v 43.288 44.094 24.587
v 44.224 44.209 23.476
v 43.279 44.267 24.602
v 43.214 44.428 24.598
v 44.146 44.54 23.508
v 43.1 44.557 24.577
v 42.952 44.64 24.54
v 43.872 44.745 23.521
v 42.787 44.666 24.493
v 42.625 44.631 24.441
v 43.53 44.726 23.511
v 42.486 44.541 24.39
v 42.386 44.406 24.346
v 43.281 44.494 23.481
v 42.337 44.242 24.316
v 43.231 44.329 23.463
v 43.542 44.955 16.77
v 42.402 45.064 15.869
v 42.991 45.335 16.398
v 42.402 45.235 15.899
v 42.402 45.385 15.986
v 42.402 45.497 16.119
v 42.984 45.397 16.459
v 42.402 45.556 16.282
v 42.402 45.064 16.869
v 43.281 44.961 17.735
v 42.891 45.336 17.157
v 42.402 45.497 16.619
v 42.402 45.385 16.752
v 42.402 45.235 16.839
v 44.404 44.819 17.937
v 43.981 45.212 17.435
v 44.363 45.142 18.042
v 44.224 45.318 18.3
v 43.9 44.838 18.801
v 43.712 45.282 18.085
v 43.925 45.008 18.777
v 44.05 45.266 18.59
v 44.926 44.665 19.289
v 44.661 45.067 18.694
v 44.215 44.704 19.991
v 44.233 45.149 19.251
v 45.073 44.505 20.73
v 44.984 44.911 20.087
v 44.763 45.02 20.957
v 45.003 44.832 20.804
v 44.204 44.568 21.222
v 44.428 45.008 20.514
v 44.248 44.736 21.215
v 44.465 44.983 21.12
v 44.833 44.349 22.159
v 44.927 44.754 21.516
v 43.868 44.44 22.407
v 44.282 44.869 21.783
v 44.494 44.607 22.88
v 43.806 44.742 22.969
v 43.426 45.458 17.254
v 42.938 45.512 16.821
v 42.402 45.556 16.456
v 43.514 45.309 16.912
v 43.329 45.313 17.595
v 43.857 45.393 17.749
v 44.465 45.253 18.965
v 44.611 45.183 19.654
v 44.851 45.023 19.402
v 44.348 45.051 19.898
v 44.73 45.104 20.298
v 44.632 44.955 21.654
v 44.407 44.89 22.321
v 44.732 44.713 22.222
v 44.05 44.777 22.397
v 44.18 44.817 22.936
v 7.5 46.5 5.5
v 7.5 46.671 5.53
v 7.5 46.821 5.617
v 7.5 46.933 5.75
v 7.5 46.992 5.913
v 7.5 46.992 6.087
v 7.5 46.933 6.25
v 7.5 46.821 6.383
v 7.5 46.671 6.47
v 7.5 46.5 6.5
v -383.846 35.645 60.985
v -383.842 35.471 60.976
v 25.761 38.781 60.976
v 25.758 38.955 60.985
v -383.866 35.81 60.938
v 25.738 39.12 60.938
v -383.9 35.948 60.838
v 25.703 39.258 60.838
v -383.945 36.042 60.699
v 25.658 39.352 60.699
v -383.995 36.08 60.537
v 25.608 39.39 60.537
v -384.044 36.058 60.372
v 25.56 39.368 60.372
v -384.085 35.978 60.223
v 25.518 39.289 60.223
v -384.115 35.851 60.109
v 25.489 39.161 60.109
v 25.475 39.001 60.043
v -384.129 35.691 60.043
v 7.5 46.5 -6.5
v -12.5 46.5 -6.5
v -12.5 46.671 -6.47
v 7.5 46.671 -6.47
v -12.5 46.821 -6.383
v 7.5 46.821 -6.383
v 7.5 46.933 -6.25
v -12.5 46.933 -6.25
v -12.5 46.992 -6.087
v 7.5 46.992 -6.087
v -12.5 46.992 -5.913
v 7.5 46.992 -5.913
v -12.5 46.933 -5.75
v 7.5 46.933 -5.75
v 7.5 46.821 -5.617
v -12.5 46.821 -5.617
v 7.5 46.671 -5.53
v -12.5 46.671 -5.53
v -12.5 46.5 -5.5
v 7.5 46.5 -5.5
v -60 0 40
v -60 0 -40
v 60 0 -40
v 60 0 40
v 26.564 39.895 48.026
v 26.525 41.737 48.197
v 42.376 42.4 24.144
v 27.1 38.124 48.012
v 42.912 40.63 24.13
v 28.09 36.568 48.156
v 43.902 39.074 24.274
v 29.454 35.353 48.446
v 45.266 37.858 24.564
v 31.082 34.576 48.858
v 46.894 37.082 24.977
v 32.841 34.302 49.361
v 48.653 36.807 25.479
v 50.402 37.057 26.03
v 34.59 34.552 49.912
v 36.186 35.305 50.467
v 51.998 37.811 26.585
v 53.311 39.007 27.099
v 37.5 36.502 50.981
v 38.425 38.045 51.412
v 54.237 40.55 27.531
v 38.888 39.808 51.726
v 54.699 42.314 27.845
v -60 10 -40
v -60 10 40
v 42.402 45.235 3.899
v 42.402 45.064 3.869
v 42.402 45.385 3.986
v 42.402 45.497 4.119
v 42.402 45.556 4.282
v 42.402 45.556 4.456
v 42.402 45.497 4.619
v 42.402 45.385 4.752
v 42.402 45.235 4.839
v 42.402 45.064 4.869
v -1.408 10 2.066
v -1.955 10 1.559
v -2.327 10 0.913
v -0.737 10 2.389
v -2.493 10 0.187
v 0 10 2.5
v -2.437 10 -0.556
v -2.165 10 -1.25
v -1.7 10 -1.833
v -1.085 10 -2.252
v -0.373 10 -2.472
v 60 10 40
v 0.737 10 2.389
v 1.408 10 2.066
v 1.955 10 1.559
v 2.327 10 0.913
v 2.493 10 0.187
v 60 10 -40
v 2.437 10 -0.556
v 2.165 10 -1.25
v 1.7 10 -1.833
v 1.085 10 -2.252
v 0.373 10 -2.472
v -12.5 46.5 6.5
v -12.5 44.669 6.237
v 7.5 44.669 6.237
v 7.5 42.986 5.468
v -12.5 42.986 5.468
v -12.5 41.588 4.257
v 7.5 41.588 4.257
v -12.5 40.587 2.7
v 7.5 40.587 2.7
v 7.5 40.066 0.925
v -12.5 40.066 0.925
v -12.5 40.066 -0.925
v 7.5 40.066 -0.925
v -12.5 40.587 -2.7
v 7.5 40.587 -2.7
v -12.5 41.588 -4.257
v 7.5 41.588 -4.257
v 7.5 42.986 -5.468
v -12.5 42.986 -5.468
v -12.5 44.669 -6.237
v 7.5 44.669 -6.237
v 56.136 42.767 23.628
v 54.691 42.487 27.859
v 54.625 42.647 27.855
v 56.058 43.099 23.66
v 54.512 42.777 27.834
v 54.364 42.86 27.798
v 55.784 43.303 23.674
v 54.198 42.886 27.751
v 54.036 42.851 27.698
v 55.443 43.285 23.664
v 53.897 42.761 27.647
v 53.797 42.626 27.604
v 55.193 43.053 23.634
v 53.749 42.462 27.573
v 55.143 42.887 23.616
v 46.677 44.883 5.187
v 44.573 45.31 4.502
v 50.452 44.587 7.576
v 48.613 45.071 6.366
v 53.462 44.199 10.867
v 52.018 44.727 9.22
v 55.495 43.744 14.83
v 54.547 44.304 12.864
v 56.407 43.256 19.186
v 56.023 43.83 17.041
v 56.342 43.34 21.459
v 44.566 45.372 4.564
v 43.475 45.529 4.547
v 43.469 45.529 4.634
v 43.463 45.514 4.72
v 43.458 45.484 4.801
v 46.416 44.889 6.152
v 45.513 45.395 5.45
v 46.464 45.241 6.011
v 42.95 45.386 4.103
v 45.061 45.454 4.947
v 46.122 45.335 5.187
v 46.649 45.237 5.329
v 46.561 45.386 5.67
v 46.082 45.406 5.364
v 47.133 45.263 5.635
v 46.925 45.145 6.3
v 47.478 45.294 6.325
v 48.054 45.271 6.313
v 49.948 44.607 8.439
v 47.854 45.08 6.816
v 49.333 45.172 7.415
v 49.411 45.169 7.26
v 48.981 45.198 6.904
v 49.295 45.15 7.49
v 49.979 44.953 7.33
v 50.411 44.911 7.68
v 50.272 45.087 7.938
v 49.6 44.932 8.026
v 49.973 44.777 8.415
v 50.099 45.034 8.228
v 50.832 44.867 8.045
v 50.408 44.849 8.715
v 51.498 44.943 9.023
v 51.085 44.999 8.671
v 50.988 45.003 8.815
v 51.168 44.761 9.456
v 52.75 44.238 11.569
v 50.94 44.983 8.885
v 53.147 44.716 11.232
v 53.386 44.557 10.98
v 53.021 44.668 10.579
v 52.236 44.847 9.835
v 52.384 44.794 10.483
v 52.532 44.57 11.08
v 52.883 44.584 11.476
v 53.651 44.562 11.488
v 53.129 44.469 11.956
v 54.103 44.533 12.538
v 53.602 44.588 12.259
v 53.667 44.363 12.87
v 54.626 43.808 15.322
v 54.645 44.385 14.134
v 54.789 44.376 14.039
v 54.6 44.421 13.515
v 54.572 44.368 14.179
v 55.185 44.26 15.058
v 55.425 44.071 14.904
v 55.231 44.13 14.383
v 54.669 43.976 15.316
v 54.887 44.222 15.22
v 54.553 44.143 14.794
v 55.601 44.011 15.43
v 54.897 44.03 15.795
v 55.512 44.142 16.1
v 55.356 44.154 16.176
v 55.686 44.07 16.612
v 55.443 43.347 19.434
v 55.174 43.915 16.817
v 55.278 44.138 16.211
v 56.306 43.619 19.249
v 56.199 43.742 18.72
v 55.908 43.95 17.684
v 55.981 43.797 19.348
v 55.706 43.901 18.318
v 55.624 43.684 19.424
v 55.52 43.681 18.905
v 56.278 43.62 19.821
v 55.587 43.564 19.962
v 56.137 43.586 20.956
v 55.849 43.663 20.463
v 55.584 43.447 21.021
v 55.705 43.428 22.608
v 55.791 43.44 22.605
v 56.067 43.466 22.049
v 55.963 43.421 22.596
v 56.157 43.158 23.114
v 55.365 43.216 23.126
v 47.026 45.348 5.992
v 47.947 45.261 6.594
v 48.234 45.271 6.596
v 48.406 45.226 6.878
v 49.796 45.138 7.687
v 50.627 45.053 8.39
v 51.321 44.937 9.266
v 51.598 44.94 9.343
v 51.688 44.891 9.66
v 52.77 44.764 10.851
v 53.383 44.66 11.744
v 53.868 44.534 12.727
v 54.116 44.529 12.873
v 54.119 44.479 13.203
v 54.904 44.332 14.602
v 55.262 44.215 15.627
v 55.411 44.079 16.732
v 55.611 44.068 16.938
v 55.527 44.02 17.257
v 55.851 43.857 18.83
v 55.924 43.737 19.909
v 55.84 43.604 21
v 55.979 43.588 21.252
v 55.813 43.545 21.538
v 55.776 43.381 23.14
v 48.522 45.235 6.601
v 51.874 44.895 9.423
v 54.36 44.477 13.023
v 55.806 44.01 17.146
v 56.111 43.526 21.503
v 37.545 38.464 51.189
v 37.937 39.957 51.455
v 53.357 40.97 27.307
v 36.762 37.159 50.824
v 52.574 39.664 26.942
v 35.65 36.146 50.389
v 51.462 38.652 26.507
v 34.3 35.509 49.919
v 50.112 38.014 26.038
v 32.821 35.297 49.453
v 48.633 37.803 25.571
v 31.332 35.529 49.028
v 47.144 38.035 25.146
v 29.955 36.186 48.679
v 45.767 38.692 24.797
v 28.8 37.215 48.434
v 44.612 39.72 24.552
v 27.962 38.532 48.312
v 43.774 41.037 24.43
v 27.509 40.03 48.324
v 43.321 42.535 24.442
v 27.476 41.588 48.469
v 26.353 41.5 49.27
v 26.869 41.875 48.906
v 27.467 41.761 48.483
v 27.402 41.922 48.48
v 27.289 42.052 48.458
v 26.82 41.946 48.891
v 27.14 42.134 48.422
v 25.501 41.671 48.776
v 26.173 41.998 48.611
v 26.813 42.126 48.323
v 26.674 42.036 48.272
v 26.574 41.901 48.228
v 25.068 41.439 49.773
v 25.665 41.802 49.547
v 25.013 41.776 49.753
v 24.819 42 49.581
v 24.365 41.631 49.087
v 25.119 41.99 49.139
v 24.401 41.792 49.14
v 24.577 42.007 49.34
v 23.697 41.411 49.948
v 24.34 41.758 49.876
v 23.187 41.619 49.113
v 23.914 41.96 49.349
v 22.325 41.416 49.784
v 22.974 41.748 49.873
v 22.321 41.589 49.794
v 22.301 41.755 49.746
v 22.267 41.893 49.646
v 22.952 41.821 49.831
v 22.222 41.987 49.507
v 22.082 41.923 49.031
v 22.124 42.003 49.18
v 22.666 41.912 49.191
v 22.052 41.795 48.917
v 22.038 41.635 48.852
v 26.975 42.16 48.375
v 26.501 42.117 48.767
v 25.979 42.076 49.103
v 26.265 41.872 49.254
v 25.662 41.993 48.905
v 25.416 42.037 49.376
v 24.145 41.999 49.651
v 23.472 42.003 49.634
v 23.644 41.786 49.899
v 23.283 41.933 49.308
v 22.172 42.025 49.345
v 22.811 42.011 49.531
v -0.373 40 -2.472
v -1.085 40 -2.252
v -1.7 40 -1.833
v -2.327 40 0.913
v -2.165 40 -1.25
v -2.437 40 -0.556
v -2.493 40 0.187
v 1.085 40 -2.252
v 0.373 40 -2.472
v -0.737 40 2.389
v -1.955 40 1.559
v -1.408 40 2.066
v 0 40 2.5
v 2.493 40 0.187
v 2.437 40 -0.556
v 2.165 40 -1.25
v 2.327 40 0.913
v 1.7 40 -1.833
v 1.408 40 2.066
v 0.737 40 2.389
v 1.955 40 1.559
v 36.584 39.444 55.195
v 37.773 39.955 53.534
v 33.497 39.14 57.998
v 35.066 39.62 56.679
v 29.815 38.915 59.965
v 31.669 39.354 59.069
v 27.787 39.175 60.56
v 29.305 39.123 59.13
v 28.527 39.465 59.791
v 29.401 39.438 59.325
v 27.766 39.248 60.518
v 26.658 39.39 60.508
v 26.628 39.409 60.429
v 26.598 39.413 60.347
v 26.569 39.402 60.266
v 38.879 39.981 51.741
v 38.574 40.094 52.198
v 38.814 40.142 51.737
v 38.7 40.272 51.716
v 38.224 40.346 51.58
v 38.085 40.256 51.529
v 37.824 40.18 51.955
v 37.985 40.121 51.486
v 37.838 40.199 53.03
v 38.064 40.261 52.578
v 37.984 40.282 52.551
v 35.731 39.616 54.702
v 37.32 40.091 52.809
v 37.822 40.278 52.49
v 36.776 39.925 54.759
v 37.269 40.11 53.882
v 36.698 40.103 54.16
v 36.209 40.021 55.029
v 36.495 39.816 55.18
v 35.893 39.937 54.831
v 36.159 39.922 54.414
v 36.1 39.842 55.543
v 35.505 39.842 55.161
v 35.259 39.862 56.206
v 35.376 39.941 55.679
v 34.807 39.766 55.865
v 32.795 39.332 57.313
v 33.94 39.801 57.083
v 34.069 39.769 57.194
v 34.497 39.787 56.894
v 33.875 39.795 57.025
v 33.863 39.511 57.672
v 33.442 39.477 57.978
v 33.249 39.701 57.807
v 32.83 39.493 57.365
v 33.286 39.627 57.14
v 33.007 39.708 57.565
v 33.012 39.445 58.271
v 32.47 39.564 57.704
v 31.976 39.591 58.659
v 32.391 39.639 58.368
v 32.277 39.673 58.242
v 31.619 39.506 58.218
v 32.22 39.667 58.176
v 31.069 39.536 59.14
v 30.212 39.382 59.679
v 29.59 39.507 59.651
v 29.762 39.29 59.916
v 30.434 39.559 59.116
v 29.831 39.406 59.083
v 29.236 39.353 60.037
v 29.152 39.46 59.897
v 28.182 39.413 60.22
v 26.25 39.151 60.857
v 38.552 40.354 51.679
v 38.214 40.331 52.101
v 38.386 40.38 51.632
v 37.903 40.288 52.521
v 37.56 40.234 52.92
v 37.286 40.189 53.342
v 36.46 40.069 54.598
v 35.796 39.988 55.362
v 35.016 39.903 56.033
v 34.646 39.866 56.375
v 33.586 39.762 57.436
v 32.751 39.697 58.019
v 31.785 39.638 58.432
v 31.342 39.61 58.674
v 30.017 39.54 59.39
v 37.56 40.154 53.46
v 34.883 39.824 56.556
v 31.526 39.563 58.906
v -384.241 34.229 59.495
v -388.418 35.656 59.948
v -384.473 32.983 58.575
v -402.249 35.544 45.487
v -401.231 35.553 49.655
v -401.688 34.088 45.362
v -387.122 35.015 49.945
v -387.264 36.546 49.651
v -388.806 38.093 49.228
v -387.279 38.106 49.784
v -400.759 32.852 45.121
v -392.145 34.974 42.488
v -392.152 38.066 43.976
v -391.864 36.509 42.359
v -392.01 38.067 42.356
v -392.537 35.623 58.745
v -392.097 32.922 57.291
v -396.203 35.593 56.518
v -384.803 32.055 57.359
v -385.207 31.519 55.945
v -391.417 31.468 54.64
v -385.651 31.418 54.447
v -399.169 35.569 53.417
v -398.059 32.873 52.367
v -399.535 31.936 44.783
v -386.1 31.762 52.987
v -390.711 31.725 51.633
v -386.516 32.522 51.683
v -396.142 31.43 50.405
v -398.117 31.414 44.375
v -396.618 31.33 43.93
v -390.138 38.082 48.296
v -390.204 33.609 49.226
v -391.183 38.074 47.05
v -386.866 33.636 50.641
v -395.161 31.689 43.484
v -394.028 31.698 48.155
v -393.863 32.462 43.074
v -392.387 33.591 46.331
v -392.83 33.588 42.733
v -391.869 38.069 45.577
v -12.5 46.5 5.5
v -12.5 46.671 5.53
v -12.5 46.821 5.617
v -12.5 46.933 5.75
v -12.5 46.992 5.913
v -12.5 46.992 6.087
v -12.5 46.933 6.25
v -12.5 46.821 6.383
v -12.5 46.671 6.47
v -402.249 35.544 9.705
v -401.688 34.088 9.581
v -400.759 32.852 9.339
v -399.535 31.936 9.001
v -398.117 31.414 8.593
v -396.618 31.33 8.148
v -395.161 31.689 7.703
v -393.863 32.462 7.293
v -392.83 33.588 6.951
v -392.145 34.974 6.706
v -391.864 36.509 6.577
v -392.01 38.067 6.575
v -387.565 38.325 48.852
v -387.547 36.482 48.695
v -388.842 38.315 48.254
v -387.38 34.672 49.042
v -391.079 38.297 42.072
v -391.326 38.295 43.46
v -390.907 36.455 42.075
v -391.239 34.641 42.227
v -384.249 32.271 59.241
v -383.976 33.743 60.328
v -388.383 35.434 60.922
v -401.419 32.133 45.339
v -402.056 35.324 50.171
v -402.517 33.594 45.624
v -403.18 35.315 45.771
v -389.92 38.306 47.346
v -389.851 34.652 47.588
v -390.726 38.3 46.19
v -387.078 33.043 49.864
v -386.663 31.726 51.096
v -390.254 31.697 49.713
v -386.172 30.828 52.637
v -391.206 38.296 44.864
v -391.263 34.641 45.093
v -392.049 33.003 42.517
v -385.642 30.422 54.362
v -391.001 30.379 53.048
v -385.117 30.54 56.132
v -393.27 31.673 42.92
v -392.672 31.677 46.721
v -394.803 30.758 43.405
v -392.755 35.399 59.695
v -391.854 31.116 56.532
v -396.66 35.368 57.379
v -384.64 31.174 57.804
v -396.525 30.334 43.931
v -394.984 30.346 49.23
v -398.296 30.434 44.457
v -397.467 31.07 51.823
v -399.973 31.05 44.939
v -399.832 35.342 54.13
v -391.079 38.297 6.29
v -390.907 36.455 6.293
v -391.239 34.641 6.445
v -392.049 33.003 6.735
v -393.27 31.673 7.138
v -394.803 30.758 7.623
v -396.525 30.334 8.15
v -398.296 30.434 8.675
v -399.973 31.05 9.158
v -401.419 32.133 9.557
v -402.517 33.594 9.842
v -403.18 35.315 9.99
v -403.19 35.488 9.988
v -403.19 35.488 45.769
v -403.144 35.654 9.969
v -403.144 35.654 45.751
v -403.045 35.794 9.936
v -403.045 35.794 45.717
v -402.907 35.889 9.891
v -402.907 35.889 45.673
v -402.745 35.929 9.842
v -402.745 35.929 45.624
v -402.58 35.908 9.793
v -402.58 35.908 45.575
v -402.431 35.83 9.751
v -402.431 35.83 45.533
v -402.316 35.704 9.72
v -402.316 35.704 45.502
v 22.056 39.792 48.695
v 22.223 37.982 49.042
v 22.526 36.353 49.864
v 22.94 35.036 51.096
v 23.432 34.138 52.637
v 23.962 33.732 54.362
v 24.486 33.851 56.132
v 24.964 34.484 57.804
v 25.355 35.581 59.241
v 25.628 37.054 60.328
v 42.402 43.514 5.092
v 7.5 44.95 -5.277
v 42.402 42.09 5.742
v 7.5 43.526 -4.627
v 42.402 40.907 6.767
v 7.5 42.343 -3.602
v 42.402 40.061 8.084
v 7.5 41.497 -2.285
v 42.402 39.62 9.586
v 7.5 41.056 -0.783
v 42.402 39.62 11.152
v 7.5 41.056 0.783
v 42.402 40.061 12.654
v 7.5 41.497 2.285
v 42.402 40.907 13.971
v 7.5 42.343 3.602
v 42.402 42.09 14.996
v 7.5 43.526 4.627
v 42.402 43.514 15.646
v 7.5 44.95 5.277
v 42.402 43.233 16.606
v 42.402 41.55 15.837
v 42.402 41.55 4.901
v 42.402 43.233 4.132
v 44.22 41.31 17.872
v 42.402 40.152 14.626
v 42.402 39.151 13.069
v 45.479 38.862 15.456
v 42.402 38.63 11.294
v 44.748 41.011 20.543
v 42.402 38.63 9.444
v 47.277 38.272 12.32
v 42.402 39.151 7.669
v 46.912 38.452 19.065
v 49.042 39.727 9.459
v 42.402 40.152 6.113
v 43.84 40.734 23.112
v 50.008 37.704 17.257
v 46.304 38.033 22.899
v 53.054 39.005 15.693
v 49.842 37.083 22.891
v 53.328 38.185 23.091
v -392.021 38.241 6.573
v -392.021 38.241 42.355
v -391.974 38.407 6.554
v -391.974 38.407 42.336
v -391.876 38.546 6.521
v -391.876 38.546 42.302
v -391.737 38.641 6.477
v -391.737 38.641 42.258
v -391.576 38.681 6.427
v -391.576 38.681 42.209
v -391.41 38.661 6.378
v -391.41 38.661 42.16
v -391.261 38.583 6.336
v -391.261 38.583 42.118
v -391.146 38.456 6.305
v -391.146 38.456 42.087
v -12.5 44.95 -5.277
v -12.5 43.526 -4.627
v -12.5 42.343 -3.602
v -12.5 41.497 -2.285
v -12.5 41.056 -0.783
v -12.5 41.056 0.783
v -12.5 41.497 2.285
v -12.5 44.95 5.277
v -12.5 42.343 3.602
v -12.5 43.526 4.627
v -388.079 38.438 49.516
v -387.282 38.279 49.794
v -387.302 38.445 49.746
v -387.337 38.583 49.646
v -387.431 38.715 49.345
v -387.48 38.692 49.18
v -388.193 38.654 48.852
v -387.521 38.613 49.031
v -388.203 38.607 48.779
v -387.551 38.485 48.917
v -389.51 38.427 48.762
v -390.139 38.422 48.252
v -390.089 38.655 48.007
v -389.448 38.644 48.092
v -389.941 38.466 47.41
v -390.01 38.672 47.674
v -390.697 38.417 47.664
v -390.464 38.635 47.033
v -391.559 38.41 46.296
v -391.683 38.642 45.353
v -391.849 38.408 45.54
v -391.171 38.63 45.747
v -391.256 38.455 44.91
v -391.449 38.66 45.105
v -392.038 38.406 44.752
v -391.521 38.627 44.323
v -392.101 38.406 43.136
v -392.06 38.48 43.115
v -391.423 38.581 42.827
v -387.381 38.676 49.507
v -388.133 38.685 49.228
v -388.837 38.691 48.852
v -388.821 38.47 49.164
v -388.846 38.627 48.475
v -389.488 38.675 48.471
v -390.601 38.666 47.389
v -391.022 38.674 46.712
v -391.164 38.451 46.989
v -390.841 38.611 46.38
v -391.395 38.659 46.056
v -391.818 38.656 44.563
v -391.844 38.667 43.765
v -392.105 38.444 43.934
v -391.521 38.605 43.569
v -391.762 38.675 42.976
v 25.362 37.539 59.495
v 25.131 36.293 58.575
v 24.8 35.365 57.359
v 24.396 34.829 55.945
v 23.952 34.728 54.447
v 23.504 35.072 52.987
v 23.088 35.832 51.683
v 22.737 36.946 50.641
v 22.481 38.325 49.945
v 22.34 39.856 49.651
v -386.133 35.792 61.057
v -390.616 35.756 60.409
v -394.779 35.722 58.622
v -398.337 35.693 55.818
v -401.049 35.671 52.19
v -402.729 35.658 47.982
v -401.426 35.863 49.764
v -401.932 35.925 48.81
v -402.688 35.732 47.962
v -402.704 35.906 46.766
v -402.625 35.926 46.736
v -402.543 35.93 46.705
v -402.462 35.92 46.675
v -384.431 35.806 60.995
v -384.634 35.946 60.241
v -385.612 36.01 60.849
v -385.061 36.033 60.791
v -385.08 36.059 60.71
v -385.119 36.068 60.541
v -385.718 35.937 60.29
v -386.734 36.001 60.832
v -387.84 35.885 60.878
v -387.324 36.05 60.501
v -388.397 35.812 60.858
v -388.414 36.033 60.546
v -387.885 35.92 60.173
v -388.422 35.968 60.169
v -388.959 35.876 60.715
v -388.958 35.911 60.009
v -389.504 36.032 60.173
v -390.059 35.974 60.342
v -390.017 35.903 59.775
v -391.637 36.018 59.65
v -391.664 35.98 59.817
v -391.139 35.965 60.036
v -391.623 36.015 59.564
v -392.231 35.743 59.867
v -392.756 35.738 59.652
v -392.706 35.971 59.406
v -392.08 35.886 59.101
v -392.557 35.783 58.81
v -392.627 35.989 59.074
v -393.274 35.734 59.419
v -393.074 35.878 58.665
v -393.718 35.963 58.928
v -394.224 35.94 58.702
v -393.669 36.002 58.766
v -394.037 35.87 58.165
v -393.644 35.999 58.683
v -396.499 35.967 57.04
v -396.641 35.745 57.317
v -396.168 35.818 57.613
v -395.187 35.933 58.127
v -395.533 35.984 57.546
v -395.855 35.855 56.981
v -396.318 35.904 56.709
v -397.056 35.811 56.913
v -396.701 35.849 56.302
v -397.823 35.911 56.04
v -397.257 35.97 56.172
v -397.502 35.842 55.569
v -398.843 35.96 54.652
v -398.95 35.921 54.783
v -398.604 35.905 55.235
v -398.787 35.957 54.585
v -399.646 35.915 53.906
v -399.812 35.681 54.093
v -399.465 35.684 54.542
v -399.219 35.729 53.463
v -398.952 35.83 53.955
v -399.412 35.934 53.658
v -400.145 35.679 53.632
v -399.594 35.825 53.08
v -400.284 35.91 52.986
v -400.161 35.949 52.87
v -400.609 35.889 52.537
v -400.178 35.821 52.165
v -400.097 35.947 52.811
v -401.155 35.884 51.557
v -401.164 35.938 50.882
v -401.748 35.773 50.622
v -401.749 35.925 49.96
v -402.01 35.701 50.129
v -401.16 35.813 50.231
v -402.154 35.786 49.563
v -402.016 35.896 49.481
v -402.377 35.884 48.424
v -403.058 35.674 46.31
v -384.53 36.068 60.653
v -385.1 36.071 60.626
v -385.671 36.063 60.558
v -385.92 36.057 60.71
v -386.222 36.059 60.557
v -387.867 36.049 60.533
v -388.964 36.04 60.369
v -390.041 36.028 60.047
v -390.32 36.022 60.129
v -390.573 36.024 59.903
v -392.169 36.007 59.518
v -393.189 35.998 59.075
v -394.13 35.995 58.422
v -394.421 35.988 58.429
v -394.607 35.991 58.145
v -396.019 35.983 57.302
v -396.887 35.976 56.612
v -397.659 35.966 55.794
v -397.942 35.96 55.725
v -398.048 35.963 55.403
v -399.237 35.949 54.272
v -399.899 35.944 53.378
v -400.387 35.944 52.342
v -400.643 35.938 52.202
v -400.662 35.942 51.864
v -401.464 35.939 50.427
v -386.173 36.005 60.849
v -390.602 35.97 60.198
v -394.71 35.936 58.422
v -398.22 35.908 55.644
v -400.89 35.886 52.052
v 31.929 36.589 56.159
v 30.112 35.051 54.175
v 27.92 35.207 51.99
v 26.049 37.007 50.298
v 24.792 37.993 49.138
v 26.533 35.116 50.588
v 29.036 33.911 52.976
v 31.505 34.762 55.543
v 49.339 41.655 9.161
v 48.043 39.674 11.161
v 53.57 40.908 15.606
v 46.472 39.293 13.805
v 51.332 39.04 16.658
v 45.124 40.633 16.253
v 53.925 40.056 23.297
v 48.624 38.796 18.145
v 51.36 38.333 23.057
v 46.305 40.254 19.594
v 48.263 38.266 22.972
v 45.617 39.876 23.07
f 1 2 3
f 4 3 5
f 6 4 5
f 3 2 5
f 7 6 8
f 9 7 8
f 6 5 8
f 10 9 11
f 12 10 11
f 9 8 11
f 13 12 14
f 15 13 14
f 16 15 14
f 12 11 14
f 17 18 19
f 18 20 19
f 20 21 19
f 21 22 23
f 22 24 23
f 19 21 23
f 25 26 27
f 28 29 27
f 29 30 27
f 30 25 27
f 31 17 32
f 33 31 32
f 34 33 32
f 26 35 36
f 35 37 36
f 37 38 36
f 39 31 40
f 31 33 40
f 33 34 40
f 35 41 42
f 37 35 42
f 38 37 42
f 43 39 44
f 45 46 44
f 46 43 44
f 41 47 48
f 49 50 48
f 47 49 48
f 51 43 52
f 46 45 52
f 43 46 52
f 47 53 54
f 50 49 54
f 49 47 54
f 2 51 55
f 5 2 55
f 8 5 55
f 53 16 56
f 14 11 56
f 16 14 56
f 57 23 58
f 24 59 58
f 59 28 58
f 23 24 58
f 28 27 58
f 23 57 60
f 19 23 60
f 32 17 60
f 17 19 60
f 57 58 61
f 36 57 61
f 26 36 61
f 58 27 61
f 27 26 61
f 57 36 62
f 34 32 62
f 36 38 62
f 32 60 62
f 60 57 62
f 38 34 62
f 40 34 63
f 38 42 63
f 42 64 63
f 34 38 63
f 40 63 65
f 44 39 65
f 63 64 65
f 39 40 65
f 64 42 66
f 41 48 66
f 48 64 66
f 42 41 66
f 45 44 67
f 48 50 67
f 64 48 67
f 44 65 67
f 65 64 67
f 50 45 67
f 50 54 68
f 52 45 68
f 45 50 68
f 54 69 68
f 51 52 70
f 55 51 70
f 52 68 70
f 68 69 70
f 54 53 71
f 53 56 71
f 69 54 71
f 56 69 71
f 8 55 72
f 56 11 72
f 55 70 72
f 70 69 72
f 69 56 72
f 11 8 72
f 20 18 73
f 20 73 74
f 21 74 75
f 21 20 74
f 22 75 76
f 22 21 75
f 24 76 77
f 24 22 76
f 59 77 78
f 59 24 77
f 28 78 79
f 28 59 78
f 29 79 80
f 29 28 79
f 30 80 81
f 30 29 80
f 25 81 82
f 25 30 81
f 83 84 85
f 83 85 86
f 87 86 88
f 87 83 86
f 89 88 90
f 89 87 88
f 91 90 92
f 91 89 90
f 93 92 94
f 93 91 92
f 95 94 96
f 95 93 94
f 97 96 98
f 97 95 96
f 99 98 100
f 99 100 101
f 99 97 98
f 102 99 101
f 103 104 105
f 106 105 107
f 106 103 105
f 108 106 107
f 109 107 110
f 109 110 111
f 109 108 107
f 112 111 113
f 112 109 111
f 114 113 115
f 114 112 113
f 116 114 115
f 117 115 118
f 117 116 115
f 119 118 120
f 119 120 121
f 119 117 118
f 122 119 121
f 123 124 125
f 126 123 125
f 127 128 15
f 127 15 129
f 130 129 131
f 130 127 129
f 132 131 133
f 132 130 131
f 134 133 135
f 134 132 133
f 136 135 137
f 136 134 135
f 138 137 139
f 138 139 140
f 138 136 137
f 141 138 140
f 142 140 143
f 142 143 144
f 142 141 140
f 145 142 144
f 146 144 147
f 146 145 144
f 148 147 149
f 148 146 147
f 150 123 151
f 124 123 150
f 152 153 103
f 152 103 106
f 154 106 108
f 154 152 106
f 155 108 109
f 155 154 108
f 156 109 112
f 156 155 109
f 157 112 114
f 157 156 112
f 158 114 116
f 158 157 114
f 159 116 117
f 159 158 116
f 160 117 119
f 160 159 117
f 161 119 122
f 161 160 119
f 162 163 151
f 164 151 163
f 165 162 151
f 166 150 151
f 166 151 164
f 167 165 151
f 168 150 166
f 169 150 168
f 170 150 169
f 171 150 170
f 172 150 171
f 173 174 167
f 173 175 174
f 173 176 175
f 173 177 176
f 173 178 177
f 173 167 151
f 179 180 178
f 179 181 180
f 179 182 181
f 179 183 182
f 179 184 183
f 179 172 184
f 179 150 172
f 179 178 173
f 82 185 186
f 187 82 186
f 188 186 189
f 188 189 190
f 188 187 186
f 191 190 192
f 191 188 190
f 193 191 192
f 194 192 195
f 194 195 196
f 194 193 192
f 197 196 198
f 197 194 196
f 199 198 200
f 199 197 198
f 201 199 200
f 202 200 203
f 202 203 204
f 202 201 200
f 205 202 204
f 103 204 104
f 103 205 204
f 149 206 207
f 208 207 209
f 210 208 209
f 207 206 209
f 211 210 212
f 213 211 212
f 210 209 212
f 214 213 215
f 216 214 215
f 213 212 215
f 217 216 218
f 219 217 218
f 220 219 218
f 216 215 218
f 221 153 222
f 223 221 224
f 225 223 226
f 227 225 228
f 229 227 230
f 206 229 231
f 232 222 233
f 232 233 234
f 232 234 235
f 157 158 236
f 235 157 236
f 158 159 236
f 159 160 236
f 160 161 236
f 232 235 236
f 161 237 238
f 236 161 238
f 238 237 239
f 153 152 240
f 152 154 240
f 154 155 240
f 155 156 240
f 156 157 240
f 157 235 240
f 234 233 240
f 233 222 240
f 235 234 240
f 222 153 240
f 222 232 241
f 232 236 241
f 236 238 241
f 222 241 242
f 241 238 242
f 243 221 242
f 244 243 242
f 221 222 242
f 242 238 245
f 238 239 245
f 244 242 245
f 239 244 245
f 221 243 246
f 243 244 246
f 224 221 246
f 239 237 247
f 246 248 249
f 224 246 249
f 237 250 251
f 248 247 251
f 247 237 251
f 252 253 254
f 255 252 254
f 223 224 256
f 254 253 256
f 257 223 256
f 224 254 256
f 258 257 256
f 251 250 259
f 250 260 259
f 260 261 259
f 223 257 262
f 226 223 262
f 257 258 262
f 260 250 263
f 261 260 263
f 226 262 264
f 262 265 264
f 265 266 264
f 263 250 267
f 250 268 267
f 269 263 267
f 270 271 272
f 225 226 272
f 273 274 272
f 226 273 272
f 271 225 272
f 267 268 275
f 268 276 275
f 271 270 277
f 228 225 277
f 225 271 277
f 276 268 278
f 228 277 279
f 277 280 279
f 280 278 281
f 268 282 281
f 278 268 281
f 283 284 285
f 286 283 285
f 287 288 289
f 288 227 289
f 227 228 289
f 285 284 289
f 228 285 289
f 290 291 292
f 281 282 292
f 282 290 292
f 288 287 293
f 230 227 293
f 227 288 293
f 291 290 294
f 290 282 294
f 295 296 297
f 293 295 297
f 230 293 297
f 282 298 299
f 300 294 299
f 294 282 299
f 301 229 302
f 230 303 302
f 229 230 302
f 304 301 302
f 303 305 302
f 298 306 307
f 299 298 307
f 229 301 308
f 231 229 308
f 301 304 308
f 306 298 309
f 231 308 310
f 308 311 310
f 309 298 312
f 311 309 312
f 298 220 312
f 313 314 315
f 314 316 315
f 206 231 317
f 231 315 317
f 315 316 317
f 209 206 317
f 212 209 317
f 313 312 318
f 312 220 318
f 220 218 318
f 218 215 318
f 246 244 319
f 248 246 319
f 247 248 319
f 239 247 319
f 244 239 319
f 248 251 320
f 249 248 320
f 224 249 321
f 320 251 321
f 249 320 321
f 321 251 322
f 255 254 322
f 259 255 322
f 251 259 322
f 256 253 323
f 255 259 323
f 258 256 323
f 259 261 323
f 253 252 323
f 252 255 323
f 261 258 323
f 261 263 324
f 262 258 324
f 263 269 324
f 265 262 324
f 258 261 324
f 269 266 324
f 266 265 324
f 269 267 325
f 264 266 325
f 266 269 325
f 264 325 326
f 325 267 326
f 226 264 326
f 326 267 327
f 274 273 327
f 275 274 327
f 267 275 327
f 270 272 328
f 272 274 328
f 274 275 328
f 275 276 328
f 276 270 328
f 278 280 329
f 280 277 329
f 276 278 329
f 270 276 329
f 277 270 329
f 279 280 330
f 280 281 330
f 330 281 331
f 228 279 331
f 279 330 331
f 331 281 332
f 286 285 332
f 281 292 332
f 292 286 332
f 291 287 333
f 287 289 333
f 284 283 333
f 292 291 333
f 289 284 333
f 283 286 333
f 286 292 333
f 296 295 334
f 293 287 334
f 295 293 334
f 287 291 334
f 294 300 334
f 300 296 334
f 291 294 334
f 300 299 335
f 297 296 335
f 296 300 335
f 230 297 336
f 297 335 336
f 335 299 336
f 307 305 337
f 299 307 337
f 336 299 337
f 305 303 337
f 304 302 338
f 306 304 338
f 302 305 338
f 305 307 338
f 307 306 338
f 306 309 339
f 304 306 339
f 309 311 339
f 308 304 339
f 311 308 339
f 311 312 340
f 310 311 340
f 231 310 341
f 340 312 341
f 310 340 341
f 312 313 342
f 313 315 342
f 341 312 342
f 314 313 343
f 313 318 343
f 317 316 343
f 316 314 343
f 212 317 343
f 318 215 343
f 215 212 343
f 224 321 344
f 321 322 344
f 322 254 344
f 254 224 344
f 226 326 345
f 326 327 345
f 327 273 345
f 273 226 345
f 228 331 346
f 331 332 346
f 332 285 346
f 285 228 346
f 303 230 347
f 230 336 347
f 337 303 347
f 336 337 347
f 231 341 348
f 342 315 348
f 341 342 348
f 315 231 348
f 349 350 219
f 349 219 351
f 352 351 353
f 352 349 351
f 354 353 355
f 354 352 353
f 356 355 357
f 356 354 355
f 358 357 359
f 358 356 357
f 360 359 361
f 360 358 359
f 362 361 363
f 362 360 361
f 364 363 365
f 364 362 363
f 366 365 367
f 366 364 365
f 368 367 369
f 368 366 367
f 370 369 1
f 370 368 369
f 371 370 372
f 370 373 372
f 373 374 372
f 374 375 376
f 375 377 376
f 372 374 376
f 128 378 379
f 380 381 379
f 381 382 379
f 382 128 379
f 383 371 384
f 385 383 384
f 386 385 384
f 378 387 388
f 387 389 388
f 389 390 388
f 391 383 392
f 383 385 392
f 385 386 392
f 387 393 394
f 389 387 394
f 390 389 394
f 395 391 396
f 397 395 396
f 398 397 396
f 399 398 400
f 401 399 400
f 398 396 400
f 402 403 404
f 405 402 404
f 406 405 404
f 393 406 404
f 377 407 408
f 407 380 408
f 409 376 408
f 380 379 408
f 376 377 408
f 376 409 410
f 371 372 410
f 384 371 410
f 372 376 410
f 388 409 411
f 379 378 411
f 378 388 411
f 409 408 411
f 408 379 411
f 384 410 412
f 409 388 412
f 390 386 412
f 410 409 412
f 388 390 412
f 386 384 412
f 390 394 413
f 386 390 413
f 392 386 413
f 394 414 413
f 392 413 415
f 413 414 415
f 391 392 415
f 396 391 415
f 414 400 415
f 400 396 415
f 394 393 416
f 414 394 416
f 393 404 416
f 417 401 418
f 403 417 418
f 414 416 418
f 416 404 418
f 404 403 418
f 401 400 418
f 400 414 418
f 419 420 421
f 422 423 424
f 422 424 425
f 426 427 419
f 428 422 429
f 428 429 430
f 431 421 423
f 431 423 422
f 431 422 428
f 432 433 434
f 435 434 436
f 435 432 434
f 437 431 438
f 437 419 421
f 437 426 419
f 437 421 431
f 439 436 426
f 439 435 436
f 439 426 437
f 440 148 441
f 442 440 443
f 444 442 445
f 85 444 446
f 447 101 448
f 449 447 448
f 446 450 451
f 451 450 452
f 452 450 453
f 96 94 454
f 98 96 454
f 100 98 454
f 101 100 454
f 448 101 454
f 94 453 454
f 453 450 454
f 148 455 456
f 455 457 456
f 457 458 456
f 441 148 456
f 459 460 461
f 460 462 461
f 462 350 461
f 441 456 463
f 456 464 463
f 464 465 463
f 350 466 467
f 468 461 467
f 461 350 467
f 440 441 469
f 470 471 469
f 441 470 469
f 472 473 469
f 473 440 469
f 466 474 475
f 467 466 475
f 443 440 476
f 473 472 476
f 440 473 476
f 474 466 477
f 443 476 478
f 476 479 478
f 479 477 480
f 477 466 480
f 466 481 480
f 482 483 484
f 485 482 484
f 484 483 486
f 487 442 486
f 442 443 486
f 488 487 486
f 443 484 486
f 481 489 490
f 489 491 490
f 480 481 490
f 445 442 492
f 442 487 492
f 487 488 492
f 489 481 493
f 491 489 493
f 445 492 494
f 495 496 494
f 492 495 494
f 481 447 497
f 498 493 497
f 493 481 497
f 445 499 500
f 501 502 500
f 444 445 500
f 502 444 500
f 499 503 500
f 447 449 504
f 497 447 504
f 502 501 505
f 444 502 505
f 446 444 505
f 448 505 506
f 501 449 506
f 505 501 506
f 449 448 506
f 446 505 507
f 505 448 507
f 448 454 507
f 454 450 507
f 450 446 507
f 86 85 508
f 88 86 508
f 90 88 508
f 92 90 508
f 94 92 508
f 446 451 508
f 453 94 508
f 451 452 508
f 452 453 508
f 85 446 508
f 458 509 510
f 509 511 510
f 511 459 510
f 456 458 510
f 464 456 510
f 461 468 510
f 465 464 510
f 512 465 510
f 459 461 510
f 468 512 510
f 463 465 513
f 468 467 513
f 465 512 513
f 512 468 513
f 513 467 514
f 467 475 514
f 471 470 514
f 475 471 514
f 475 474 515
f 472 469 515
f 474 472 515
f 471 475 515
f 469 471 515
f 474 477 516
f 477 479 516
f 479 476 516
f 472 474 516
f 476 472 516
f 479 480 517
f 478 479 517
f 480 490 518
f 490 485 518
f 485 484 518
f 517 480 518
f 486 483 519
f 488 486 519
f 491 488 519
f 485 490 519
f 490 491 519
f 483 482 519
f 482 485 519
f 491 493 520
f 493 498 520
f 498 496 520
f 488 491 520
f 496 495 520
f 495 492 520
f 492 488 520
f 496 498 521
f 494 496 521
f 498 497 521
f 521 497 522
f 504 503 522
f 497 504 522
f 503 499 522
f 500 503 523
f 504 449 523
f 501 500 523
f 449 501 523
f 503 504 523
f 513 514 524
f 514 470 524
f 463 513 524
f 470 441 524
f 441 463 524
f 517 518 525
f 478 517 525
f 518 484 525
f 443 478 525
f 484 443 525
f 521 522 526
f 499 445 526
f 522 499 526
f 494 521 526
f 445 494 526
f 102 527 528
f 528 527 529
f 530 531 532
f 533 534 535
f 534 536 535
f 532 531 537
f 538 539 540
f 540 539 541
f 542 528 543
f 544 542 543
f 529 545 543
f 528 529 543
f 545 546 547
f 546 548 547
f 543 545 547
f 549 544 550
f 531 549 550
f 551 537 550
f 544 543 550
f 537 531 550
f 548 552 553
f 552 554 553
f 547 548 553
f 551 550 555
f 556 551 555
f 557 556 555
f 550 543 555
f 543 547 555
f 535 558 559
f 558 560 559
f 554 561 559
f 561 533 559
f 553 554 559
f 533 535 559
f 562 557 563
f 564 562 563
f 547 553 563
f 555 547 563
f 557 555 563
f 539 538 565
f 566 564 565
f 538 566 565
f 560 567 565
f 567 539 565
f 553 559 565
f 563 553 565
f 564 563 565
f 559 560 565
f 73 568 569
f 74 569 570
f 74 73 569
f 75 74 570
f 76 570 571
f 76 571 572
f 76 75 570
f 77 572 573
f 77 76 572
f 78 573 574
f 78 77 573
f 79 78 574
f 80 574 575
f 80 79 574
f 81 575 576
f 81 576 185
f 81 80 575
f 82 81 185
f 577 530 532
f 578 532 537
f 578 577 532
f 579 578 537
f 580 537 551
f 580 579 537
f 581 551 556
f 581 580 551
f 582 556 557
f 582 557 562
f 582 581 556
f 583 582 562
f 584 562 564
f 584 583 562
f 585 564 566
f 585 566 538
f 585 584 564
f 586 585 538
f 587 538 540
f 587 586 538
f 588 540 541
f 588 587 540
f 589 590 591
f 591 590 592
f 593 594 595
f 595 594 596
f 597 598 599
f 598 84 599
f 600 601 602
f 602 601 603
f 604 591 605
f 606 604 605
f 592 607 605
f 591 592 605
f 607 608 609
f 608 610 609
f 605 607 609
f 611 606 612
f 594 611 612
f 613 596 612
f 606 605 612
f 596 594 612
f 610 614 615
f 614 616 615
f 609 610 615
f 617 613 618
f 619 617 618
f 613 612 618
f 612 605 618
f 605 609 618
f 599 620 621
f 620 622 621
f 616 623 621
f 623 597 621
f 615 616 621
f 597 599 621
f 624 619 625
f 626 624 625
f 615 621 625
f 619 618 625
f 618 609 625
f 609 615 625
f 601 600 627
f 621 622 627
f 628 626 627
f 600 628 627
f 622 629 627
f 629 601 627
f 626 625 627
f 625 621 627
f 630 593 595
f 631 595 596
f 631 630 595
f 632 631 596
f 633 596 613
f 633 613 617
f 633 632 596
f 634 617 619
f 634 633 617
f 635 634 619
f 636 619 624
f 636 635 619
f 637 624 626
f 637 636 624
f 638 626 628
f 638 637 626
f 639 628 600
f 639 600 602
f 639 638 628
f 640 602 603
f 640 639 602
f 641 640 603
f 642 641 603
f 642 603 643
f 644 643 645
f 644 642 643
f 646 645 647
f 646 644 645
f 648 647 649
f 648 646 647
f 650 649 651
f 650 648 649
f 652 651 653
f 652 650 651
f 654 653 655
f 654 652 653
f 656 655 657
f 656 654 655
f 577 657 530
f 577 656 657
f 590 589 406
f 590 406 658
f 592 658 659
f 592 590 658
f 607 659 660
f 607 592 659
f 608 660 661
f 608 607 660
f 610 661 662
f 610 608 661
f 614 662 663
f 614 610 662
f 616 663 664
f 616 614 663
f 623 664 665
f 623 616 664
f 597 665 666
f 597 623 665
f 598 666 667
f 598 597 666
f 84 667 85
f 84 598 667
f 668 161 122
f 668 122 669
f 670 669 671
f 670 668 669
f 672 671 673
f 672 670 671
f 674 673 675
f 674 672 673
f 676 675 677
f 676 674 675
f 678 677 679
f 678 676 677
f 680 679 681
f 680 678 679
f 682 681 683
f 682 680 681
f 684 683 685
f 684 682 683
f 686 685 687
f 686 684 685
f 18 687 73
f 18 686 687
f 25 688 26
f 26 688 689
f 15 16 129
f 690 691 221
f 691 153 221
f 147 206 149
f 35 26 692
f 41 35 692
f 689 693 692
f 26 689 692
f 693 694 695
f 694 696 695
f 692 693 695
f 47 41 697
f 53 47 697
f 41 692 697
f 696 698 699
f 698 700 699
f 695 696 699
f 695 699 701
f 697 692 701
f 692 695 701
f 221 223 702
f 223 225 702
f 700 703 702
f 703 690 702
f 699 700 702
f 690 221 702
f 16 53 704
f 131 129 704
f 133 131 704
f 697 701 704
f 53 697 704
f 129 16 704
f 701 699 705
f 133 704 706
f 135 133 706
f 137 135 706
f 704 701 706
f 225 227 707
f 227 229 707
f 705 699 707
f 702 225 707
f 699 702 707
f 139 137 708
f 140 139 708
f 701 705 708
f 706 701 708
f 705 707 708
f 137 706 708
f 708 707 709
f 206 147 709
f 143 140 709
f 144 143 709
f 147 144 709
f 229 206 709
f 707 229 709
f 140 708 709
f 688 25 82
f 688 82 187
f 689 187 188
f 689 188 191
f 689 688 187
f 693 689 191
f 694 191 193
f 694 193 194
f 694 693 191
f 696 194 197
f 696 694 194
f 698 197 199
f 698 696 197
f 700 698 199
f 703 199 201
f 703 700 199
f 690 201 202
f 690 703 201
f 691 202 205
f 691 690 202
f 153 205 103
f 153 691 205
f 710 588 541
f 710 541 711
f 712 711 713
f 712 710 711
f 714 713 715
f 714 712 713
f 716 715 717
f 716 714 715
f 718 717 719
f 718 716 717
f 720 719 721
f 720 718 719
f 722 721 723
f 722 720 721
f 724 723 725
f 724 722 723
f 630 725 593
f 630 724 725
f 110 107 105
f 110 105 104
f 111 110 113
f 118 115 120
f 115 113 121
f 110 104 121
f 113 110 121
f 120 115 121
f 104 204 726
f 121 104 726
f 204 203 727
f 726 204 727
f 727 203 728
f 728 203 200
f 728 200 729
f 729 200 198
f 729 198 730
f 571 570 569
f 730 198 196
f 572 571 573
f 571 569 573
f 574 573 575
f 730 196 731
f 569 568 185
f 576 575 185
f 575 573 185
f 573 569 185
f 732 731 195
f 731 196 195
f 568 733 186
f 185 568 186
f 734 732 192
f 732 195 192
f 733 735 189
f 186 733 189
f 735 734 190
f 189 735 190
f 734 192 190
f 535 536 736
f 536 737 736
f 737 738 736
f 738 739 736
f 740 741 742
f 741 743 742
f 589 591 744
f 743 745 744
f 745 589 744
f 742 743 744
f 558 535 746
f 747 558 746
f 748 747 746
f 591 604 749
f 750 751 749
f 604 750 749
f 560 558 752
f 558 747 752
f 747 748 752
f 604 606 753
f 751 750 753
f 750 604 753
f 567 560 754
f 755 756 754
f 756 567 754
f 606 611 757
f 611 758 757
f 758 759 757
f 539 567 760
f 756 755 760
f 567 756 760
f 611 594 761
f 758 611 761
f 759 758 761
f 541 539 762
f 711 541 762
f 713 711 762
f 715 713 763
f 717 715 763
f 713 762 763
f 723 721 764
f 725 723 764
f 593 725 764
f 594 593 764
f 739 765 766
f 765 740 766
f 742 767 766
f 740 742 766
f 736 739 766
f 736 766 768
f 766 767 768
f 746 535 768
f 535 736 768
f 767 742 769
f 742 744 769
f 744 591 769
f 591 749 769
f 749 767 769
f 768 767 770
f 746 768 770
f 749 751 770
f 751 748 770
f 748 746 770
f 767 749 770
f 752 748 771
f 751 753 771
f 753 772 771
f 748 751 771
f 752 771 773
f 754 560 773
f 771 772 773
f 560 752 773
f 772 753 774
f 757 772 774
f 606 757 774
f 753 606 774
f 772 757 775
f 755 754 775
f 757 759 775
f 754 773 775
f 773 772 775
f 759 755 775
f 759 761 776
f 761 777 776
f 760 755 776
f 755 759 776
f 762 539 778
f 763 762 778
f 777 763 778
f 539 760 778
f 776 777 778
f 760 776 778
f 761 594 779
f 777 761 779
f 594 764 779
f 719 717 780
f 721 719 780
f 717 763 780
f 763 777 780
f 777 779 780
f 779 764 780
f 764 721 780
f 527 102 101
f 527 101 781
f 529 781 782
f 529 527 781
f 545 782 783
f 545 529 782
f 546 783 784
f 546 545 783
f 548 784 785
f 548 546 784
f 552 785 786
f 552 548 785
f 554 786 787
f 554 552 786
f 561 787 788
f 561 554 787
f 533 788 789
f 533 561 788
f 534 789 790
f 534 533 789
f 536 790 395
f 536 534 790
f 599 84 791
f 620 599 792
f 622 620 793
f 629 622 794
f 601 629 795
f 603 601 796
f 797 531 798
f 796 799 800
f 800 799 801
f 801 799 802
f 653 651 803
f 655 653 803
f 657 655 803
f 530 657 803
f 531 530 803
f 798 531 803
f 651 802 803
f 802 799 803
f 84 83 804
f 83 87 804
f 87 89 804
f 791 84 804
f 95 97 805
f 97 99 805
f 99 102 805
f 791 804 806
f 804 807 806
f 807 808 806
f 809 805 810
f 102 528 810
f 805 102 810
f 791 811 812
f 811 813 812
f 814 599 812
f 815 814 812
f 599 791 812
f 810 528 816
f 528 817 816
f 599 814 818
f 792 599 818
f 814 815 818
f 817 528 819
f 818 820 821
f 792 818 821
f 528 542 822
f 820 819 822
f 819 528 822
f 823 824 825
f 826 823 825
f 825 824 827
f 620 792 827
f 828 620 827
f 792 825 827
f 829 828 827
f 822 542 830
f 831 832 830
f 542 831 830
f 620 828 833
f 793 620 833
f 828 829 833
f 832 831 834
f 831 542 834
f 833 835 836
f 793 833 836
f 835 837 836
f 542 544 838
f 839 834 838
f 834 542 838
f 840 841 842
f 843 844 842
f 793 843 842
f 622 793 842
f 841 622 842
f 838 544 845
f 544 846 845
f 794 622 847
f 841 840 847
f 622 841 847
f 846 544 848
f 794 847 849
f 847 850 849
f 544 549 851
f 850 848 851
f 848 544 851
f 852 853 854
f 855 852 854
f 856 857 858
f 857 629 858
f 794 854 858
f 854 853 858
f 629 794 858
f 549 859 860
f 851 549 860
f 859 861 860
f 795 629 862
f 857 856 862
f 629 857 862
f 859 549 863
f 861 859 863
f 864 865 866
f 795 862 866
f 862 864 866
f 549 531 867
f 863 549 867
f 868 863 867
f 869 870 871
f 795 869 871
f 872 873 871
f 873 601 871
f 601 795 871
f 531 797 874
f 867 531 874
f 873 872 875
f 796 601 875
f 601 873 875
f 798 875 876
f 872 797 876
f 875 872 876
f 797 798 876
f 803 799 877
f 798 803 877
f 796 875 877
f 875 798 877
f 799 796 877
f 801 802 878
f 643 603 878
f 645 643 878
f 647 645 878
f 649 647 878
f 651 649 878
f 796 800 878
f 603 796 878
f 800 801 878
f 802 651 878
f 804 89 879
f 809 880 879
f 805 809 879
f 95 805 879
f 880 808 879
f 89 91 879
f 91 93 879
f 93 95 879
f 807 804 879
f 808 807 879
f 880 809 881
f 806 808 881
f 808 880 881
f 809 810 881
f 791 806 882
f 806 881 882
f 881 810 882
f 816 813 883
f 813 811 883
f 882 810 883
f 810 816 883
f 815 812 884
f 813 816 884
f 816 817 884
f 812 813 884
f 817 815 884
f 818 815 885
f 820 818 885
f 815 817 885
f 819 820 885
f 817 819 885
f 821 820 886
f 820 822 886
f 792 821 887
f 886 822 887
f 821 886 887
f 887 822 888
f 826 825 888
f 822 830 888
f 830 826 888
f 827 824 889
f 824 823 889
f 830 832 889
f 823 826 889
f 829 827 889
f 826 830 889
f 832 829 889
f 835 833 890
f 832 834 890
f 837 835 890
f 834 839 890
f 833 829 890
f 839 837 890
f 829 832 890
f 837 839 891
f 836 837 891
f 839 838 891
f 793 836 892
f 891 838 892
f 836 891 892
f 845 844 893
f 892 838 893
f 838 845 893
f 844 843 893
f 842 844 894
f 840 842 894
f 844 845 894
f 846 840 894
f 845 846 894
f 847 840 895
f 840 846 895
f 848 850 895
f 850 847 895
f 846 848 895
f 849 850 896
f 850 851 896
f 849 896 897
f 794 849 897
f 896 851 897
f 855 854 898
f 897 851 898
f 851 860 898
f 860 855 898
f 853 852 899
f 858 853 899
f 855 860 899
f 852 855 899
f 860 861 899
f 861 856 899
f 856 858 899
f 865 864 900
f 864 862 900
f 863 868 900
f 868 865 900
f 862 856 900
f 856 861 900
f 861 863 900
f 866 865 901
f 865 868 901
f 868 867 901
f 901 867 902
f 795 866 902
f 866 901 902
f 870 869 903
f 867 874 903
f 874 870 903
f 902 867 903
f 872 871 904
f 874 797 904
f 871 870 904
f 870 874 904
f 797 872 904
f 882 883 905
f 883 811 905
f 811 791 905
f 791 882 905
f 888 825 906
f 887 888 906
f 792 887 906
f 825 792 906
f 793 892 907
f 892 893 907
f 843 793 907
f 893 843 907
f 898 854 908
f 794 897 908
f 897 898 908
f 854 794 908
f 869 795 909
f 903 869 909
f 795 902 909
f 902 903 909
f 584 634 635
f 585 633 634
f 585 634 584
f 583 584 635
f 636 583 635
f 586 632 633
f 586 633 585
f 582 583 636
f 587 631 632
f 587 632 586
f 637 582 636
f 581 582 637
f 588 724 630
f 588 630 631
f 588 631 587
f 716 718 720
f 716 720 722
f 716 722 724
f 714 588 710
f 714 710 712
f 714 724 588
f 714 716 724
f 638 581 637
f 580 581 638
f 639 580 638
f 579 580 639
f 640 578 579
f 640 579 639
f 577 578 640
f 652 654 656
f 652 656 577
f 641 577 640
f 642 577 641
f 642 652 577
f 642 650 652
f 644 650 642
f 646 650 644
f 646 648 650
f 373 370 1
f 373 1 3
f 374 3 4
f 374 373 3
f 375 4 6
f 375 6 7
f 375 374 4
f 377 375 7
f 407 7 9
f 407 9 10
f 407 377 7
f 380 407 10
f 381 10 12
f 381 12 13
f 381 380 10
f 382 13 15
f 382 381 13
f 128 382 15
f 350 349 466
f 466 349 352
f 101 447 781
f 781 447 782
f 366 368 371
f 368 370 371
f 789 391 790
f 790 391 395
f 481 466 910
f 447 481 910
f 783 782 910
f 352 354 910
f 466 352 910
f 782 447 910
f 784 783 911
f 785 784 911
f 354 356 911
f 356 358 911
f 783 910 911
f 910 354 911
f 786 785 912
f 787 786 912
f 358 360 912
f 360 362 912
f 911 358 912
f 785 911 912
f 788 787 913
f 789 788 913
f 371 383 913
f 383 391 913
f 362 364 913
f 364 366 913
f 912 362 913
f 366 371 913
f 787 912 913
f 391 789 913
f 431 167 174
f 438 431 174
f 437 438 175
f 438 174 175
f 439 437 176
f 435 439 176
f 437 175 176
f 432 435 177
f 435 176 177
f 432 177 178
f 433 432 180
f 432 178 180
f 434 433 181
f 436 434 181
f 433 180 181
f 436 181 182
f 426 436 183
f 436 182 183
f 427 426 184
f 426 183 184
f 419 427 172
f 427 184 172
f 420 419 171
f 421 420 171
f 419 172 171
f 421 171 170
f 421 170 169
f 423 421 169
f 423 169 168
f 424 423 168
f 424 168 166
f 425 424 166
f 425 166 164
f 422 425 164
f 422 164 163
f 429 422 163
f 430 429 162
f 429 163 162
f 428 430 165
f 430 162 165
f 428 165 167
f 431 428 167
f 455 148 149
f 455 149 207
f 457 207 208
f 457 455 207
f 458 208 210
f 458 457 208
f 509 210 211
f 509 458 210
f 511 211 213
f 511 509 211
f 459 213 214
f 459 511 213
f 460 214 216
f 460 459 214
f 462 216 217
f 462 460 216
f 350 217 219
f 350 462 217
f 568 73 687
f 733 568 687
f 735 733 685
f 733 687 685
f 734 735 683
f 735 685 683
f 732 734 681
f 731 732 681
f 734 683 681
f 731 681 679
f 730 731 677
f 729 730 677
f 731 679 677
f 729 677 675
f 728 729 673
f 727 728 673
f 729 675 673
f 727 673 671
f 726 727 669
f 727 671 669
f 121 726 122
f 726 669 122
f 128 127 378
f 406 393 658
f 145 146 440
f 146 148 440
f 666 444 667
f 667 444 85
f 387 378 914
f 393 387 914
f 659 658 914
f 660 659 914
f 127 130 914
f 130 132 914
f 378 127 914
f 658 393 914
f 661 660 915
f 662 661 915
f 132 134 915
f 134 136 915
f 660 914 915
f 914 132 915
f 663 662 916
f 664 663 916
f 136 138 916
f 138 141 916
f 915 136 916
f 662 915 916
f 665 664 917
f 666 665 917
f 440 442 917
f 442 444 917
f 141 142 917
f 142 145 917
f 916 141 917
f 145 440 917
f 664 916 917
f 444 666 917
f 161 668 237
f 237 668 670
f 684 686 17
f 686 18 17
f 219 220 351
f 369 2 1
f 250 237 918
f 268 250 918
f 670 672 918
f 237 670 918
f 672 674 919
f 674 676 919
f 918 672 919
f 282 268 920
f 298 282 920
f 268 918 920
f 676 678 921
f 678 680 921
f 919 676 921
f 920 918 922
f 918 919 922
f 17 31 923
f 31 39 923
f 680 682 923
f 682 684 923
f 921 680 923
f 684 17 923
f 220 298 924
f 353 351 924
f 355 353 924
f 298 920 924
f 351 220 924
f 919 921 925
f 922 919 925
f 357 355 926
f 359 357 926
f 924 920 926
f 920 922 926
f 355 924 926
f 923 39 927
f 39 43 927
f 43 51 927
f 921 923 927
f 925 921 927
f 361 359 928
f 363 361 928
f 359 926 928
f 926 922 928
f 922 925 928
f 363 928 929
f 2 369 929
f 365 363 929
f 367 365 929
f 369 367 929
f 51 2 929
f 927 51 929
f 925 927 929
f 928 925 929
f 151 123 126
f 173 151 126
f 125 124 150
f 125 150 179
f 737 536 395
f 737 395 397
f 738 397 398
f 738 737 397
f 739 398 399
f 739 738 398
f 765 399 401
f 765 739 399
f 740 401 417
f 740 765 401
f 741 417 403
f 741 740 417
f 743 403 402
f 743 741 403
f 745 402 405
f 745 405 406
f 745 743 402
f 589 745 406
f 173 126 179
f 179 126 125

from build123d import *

# Parameters (mm, degrees)
SKETCH_1_W      = 120
SKETCH_1_H      = 80
EXTRUDE_1_DEPTH = 10
SKETCH_2_R      = 2.5
EXTRUDE_2_DEPTH = 30


with BuildPart() as part:
    # 草圖1 → 填料-伸長1 (new body)
    with BuildSketch(Plane(origin=(0, 0, 0), x_dir=(1, 0, 0), z_dir=(0, 1, 0))):
        Rectangle(SKETCH_1_W, SKETCH_1_H)
    extrude(amount=EXTRUDE_1_DEPTH)

    # 草圖2 → 填料-伸長2 (add)
    with BuildSketch(Plane(origin=(0, 10, 0), x_dir=(1, 0, 0), z_dir=(0, 1, 0))):
        with Locations(Location((0, 0, 0), (0, 0, 270))):
            Circle(SKETCH_2_R)
    extrude(amount=EXTRUDE_2_DEPTH)


with BuildPart() as body_2:
    # 掃出1: sweep along a path in 草圖3
    with BuildLine(Plane.XY) as sweep_1_path:
        Line((-12.5, 41), (7.5, 41))
    # 草圖4 → 掃出1 (sweep)
    with BuildSketch(Plane(origin=(-12.5, 0, 0), x_dir=(0, 0, -1), z_dir=(1, 0, 0))):
        with BuildLine():
            ThreePointArc((-5.5, 46.5), (0, 41), (5.5, 46.5))
            ThreePointArc((5.5, 46.5), (6, 47), (6.5, 46.5))
            ThreePointArc((6.5, 46.5), (0, 40), (-6.5, 46.5))
            ThreePointArc((-6.5, 46.5), (-6, 47), (-5.5, 46.5))
        make_face()
    sweep(path=sweep_1_path.line)

    # 掃出2: sweep along a curve in space
    with BuildLine() as sweep_2_path:
        Line((7.5, 41, 0), (42.401838518, 39.563899431, 10.369122232))
        ThreePointArc((42.401838518, 39.563899431, 10.369122232), (48.928397468, 38.833657208, 16.488978634), (47.881691677, 37.863683506, 25.351564364))
        Line((47.881691677, 37.863683506, 25.351564364), (32.069773811, 35.358255461, 49.233294254))
        ThreePointArc((32.069773811, 35.358255461, 49.233294254), (28.465150667, 35.002314618, 52.515869541), (23.726236743, 34.845653085, 53.704757421))
        Line((23.726236743, 34.845653085, 53.704757421), (-385.877198334, 31.535508386, 53.704757421))
        ThreePointArc((-385.877198334, 31.535508386, 53.704757421), (-392.948035259, 31.478366548, 50.775825233), (-395.87687181, 31.454697623, 43.704757421))
        Line((-395.87687181, 31.454697623, 43.704757421), (-395.87687181, 31.454697623, 7.923107717))
    # 草圖5 → 掃出2 (sweep)
    with BuildSketch(Plane(origin=(7.5, 0, 0), x_dir=(0, 0, -1), z_dir=(1, 0, 0))):
        with BuildLine():
            ThreePointArc((-5.5, 46.5), (0, 41), (5.5, 46.5))
            ThreePointArc((5.5, 46.5), (6, 47), (6.5, 46.5))
            ThreePointArc((6.5, 46.5), (0, 40), (-6.5, 46.5))
            ThreePointArc((-6.5, 46.5), (-6, 47), (-5.5, 46.5))
        make_face()
    sweep(path=sweep_2_path.line)


solid = Compound([part.part, body_2.part])
